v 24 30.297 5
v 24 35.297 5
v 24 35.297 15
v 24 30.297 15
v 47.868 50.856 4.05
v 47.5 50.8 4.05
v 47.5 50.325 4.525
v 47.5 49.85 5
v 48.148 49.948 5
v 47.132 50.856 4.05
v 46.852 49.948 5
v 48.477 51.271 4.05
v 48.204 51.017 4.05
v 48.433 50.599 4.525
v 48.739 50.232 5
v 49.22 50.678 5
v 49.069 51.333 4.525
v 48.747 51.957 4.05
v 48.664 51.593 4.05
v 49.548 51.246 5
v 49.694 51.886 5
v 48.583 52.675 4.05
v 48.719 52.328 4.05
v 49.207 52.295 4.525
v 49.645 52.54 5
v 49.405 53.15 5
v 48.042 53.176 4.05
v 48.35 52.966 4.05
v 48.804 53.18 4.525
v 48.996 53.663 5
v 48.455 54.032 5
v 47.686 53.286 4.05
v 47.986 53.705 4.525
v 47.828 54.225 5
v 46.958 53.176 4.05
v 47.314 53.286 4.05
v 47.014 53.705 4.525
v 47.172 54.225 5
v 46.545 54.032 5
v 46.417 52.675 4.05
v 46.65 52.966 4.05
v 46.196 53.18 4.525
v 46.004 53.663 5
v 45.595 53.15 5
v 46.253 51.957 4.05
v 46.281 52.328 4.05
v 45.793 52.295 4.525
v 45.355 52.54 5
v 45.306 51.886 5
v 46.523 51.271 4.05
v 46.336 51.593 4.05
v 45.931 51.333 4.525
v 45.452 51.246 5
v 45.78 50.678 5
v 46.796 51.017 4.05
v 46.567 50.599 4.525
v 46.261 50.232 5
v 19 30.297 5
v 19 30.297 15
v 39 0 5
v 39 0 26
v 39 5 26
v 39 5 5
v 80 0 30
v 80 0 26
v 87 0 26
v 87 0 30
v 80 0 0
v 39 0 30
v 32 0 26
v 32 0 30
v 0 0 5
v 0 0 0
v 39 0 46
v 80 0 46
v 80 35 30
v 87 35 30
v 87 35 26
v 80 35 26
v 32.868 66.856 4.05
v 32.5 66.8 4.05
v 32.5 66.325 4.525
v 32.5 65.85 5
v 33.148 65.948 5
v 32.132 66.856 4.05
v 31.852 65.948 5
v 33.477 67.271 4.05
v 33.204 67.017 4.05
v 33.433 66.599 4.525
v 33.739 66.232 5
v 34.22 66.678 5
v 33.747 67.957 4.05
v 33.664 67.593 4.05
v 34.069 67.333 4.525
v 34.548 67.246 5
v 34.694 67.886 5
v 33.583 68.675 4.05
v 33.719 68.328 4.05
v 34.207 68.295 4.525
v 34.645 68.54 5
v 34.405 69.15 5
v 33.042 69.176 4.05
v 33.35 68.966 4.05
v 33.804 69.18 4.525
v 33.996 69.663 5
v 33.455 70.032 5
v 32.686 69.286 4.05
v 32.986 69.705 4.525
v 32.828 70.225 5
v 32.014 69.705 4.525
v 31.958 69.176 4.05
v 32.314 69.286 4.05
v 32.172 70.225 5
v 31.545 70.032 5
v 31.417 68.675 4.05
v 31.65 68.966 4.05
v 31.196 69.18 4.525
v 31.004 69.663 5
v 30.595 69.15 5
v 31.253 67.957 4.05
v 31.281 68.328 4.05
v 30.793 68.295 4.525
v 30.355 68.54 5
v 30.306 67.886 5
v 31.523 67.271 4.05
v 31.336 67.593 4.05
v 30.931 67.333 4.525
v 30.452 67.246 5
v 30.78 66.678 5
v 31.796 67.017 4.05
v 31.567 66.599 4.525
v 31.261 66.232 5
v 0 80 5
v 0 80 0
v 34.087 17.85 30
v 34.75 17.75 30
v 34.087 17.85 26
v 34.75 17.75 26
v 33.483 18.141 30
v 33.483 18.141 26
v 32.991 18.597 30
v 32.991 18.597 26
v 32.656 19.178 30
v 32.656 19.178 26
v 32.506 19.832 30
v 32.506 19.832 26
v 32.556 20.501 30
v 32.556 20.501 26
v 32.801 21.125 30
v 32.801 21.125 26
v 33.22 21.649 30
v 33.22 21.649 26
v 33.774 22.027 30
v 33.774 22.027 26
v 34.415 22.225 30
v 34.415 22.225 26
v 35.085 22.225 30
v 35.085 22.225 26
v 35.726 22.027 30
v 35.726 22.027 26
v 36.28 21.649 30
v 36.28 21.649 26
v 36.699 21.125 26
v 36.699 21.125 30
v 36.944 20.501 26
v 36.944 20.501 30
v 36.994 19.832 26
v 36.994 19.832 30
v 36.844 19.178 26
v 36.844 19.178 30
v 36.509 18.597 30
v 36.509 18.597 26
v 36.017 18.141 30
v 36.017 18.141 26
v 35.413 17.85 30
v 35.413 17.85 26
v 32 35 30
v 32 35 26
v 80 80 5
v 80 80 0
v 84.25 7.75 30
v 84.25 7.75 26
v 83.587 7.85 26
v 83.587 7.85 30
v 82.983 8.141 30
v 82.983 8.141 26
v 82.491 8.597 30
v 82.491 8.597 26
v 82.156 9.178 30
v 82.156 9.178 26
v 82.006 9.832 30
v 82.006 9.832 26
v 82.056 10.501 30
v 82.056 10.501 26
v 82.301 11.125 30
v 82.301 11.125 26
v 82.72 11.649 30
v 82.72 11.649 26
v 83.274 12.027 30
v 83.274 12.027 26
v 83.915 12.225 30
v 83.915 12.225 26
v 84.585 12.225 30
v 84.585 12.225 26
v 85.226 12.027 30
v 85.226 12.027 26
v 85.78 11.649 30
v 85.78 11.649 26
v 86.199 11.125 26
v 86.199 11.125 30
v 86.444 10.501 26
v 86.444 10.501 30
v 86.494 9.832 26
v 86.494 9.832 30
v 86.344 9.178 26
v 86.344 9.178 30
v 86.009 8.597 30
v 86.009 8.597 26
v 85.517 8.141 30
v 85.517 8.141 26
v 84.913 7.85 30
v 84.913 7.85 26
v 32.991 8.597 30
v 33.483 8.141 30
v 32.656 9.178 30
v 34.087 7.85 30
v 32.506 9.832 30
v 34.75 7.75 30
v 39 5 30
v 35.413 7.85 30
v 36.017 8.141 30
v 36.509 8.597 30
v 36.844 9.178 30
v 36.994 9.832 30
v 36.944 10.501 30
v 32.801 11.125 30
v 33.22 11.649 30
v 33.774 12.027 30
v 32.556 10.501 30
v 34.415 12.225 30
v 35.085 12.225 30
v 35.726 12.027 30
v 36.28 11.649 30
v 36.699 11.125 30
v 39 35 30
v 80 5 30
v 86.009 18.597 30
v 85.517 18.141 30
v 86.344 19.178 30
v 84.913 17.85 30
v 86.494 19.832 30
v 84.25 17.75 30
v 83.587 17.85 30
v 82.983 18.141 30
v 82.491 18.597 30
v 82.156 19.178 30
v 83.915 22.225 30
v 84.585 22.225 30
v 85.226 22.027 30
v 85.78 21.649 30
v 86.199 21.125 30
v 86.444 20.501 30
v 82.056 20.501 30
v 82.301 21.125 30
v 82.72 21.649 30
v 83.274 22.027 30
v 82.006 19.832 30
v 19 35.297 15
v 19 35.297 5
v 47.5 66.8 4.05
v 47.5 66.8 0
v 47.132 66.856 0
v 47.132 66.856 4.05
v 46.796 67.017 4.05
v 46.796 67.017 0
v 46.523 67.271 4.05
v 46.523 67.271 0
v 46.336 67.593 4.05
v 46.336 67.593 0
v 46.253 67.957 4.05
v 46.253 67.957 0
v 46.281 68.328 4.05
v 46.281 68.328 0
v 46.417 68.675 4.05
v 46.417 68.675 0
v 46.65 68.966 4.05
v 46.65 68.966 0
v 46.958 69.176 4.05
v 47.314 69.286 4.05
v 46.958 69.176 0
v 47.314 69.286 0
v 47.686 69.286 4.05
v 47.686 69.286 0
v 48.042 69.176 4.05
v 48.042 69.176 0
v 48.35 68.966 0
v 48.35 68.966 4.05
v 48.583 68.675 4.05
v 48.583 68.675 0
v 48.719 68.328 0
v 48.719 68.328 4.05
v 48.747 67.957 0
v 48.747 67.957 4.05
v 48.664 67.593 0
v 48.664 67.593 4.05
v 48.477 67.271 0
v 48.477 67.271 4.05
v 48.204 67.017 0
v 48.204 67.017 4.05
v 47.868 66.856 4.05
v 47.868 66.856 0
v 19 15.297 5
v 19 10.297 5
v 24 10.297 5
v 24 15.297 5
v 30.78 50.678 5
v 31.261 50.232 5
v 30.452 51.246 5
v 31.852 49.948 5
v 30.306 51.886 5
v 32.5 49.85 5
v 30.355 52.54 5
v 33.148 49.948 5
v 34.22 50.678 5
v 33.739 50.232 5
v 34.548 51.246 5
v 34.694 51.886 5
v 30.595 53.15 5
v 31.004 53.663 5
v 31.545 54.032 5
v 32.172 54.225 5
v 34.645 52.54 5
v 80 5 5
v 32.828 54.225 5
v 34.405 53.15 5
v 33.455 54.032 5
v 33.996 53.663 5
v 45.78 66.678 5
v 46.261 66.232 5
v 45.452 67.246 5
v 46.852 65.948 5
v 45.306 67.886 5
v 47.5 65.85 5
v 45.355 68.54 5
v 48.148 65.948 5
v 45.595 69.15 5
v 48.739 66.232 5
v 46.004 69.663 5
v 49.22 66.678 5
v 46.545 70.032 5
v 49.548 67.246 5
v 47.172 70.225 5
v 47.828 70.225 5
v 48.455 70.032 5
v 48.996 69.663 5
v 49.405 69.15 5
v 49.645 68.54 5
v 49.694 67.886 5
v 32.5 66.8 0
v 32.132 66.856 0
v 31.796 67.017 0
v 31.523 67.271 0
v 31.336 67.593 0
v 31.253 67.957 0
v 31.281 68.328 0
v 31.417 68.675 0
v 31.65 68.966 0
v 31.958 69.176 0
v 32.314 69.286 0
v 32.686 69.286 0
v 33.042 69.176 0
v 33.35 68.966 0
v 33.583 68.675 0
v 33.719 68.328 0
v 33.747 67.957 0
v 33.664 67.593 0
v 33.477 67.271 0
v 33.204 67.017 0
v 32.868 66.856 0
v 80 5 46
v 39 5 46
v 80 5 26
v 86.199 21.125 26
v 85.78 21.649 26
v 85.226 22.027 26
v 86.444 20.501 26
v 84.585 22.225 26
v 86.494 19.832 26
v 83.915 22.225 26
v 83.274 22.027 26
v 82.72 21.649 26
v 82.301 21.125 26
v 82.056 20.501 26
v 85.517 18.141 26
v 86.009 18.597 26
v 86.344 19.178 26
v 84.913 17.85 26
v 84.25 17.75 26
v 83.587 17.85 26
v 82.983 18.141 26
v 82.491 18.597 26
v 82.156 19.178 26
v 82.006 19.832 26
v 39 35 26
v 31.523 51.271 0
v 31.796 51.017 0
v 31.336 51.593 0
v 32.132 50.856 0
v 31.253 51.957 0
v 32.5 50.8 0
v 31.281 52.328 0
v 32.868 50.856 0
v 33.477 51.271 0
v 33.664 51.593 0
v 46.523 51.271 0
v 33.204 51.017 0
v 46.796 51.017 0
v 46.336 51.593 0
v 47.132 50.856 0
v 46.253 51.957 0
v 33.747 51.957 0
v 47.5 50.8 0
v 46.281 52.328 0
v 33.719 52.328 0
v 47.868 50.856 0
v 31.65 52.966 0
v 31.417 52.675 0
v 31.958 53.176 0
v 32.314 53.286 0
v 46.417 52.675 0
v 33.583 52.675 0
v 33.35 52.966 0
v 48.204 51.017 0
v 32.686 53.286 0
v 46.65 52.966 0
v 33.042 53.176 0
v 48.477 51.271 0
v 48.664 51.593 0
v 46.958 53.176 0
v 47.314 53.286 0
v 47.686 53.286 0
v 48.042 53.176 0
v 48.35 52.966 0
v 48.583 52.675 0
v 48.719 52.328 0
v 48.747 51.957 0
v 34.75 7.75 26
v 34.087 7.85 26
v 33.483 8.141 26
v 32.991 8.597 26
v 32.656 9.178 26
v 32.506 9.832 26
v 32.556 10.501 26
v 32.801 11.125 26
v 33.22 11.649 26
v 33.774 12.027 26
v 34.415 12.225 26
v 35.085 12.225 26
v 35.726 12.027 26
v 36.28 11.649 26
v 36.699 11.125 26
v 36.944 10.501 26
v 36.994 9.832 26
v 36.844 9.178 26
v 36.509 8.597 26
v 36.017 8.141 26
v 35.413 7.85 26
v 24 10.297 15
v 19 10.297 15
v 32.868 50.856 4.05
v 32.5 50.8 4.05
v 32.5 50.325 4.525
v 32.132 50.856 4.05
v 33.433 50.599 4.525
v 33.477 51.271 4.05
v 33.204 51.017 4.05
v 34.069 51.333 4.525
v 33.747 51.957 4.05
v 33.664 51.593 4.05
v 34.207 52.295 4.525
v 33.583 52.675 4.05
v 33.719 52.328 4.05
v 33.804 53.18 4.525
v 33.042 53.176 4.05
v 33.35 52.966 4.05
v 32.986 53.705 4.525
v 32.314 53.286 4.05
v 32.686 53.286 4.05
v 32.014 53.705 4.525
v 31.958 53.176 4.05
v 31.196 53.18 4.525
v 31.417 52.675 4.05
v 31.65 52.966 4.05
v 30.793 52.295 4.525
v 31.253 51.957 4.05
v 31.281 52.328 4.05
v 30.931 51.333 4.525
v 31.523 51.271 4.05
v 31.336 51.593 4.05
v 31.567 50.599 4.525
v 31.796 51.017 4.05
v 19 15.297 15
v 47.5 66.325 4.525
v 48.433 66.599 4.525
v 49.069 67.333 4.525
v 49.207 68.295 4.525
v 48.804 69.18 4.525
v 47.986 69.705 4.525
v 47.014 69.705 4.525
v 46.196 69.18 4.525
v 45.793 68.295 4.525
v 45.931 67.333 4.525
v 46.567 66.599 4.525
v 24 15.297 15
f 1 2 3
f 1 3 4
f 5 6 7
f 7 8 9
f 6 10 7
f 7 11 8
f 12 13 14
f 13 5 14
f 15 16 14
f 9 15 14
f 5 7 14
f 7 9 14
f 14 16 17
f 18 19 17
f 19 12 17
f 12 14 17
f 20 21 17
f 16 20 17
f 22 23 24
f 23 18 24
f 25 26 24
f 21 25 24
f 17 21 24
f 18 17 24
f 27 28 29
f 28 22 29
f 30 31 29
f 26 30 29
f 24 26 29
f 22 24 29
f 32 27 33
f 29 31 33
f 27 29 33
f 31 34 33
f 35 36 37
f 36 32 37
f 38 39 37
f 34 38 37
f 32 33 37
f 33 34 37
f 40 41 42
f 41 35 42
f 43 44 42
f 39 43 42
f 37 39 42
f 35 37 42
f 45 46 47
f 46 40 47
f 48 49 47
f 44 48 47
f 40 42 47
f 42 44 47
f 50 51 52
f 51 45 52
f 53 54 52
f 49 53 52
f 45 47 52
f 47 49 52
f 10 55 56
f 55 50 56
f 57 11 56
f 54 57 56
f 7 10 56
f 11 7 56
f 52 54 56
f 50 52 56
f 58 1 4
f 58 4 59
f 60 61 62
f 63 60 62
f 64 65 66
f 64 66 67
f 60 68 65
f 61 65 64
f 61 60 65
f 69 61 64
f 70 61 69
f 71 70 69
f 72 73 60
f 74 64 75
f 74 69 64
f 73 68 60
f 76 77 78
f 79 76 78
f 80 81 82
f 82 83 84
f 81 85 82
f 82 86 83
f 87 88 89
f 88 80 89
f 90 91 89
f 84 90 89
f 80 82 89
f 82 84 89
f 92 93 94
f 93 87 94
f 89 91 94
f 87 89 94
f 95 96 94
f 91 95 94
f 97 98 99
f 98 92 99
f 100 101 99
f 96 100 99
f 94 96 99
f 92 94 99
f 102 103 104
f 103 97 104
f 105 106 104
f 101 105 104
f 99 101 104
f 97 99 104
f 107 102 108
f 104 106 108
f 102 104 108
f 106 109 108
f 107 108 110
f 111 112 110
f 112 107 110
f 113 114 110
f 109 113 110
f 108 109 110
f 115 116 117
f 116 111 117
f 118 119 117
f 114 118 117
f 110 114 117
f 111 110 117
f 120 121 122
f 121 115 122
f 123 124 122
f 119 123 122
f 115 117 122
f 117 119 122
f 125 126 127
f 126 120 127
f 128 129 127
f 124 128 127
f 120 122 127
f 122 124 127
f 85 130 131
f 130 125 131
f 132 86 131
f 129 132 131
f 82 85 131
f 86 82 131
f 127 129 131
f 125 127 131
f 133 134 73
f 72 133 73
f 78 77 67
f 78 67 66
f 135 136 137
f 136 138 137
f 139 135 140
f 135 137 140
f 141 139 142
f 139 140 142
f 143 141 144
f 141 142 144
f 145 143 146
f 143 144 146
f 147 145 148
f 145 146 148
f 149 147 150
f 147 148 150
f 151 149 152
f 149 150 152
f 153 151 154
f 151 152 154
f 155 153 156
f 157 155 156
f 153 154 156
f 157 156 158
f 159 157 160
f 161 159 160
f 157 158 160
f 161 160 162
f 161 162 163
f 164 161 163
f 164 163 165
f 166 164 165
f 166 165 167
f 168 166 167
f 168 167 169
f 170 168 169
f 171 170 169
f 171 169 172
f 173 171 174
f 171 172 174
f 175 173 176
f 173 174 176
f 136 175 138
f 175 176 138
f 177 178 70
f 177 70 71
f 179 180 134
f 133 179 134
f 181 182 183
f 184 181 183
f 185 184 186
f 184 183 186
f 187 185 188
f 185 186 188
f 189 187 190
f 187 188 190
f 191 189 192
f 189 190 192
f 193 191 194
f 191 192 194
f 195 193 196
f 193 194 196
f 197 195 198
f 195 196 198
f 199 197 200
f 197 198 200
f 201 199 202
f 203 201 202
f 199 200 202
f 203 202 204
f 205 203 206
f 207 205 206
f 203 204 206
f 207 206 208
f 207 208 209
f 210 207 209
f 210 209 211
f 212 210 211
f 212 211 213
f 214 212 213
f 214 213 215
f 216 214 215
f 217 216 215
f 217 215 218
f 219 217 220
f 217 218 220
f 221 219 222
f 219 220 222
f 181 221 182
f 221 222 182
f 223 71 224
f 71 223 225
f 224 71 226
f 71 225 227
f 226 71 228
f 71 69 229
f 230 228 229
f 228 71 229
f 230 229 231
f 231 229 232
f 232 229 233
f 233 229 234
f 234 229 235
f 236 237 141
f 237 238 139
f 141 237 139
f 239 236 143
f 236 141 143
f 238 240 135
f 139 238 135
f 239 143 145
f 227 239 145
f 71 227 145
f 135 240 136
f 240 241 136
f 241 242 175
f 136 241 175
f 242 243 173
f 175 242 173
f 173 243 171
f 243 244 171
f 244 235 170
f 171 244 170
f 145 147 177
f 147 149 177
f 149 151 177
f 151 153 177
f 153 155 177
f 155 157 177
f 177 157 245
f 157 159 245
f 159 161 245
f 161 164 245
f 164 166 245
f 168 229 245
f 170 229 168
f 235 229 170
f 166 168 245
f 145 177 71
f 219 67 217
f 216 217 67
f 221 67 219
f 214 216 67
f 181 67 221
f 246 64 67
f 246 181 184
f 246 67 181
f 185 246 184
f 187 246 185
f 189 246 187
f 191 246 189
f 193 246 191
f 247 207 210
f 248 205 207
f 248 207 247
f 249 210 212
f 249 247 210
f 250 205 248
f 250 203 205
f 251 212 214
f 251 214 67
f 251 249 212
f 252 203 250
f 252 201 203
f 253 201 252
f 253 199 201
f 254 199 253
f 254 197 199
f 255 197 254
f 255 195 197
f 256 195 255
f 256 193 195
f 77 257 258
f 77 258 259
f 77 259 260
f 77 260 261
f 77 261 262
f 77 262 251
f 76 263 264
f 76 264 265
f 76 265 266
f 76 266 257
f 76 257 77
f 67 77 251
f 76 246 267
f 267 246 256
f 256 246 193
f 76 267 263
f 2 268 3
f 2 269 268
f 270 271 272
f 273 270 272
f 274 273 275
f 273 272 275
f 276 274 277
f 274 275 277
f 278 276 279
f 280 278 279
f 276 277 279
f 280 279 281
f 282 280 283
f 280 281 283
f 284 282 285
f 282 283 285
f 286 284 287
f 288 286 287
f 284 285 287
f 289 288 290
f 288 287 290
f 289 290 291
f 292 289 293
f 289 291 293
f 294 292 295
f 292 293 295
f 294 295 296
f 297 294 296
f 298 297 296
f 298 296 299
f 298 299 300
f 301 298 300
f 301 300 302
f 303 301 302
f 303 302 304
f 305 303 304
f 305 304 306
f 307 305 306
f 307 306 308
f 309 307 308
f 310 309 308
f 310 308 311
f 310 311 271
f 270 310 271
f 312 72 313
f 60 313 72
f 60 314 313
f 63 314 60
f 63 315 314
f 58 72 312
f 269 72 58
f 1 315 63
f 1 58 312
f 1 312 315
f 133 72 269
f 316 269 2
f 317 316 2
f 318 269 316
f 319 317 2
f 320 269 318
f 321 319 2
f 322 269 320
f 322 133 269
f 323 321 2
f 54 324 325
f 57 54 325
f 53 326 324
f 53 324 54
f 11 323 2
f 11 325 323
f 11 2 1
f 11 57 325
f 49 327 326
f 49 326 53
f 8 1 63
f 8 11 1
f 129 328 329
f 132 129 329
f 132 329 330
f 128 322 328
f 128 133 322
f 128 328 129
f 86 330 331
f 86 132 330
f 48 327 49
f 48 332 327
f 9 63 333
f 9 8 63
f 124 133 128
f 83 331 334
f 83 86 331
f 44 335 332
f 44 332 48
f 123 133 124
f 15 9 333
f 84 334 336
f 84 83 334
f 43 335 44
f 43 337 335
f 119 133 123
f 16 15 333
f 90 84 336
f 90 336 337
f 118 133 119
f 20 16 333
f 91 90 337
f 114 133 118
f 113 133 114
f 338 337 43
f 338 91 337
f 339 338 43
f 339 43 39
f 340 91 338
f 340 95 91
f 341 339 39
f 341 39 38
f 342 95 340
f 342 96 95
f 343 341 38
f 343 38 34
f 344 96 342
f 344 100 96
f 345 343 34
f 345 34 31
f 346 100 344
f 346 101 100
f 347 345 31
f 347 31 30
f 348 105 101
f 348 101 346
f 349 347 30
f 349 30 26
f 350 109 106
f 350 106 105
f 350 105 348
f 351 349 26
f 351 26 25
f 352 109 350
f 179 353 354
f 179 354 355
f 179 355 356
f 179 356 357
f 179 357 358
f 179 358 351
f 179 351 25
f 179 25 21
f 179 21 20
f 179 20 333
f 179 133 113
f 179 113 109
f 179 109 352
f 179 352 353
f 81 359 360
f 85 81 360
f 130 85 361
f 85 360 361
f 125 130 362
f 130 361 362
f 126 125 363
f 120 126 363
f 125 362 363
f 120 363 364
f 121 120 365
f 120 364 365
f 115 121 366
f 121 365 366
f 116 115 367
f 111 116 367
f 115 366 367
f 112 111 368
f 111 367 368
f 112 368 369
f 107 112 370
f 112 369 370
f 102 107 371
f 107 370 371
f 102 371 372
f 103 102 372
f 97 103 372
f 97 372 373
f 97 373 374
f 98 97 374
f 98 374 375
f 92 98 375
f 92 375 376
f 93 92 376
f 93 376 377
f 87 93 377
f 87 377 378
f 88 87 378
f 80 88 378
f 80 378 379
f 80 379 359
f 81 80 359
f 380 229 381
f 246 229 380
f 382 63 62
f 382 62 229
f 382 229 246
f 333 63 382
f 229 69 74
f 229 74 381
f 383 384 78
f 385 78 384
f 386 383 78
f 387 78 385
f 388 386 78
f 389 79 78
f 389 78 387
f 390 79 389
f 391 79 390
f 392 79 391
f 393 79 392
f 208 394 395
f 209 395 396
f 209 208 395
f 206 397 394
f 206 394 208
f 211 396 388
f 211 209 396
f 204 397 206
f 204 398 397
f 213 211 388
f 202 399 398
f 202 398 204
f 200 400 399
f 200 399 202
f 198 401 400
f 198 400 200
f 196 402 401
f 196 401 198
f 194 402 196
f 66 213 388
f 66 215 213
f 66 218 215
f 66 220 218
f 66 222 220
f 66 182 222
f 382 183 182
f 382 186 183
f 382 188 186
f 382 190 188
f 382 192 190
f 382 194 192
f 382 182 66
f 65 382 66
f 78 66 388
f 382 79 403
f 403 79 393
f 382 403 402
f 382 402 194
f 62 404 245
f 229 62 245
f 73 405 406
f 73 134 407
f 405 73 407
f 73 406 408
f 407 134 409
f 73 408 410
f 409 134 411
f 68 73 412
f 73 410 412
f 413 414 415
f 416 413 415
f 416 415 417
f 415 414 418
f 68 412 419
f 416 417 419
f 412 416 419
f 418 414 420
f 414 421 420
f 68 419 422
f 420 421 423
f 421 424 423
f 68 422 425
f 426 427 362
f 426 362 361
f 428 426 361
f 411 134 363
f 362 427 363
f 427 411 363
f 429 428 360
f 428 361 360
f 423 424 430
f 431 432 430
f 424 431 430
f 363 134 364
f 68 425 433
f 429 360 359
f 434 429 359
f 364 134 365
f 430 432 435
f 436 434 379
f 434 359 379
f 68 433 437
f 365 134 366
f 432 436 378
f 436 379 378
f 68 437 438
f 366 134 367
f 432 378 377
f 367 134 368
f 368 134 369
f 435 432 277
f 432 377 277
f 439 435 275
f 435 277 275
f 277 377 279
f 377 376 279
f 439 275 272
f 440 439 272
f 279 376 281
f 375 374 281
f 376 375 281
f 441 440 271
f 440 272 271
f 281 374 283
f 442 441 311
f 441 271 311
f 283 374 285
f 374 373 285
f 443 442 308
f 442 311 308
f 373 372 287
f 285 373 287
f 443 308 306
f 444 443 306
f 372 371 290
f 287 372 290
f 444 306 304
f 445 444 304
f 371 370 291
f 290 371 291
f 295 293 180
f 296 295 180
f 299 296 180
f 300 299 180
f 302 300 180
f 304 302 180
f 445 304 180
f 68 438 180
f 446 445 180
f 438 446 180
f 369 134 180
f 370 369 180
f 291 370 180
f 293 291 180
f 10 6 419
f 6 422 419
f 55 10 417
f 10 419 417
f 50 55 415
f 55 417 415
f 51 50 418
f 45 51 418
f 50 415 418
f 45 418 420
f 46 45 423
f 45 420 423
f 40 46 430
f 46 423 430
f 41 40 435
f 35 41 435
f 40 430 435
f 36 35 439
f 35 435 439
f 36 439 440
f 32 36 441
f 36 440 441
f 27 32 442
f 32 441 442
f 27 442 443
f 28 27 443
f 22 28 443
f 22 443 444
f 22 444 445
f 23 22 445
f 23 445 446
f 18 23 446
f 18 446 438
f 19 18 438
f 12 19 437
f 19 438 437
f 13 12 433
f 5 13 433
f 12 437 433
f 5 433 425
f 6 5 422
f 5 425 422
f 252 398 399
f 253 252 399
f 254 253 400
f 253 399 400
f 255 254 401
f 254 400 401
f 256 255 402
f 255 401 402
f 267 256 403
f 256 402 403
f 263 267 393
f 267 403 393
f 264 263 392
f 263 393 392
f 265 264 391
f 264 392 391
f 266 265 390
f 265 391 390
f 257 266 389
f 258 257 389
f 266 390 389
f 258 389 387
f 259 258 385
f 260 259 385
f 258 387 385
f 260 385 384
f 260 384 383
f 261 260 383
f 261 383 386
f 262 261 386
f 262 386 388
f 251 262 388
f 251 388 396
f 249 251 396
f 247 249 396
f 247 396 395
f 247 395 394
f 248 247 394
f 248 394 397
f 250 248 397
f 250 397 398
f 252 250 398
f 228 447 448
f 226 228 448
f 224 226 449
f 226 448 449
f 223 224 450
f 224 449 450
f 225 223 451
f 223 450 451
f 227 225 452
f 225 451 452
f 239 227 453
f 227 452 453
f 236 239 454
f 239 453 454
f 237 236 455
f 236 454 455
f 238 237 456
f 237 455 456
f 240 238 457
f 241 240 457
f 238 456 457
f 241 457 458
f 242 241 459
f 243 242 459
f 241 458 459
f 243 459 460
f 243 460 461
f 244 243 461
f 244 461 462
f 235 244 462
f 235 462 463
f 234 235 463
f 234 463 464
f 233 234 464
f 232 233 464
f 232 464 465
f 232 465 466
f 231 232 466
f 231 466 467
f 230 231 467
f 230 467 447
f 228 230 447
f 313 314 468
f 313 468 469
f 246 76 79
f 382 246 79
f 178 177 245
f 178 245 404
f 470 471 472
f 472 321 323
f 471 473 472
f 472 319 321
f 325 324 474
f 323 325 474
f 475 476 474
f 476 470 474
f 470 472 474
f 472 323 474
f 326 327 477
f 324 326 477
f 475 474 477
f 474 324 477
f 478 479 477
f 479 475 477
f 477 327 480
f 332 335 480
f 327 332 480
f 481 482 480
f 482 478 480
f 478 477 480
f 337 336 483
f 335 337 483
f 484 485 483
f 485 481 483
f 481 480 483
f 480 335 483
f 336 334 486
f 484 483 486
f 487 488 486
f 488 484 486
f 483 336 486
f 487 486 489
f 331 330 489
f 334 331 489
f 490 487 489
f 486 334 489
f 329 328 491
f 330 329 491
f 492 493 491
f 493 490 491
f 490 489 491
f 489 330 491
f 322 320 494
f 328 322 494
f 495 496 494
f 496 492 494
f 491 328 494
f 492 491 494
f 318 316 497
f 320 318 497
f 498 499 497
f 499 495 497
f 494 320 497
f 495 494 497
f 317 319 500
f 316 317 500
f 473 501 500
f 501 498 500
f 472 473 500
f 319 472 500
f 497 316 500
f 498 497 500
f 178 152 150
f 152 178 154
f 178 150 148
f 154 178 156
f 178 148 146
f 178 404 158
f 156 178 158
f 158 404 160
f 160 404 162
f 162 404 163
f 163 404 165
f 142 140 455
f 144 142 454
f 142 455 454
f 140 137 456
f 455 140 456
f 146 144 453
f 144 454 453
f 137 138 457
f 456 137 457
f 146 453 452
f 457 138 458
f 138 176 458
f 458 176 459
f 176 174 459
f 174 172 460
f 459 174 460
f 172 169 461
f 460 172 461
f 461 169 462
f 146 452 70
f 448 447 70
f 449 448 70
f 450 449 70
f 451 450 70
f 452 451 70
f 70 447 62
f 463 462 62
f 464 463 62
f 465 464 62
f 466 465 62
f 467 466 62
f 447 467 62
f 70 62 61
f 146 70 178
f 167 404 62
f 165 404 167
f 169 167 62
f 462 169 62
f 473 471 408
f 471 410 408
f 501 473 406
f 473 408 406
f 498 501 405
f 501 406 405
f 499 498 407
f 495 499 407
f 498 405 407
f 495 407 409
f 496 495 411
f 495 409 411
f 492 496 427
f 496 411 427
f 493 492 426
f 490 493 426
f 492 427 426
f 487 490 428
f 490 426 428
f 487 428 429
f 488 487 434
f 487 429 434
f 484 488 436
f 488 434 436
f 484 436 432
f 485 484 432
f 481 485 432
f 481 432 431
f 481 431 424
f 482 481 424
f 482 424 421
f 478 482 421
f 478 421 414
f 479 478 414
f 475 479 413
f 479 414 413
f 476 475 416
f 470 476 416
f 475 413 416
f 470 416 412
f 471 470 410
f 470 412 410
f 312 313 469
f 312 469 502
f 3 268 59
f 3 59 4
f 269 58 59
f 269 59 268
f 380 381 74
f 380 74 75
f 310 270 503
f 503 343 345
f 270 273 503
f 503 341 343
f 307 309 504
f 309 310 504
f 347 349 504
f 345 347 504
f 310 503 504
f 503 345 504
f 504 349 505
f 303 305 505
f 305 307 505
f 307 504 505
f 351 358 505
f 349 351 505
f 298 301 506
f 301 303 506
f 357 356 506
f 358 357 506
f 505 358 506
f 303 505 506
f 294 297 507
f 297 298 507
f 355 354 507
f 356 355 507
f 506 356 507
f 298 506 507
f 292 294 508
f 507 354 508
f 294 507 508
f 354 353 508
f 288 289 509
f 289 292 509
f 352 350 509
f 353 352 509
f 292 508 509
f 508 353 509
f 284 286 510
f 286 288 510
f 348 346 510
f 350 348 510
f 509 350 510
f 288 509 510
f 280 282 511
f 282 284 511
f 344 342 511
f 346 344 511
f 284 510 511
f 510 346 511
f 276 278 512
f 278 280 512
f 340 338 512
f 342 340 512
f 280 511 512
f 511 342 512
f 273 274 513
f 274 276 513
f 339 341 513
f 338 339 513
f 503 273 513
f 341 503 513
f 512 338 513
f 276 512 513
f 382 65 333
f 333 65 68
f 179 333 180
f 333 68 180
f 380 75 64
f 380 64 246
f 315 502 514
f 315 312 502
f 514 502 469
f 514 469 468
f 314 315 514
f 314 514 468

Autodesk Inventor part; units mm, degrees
ref_plane "YZ Plane" through (0, 0, 0) normal (1, 0, 0) x (0, 1, 0)
ref_plane "XZ Plane" through (0, 0, 0) normal (0, 1, 0) x (-1, 0, 0)
ref_plane "XY Plane" through (0, 0, 0) normal (0, 0, 1) x (1, 0, 0)
sketch "Szkic1" plane through (0, 0, 0) normal (0, 0, 1) x (1, 0, 0)
  line L0 (0, 0) -> (80, 0)
  line L1 (80, 0) -> (80, 80)
  line L2 (80, 80) -> (0, 80)
  line L3 (0, 80) -> (0, 0)
  dimension "d0" = 80
  dimension "d1" = 80
extrude "Wyciągnięcie proste1" add sketch "Szkic1" along normal blind 5
sketch "Szkic2" plane through (0, 0, 5) normal (0, 0, 1) x (1, 0, 0)
  line L0 (80, 0) -> (80, 80) projected
  line L1 (80, 0) -> (39, 0)
  line L2 (39, 0) -> (39, 5)
  line L3 (39, 5) -> (80, 5)
  line L4 (80, 5) -> (80, 0)
  point P0 (0, 0)
  dimension "d6" = 41
  dimension "d7" = 5
extrude "Wyciągnięcie proste2" add sketch "Szkic2" along normal blind 41
sketch "Szkic3" plane through (0, 0, 5) normal (0, 0, 1) x (1, 0, 0)
  line L0 (19, 35.2968) -> (24, 35.2968)
  line L1 (24, 35.2968) -> (24, 30.2968)
  line L2 (24, 30.2968) -> (19, 30.2968)
  line L3 (19, 30.2968) -> (19, 35.2968)
  line L4 (19, 15.2968) -> (24, 15.2968)
  line L5 (24, 15.2968) -> (24, 10.2968)
  line L6 (24, 10.2968) -> (19, 10.2968)
  line L7 (19, 10.2968) -> (19, 15.2968)
  line L8 (39, 5) -> (39, 0) projected
  point P0 (0, 0)
  point P1 (39, 2.5)
  point P2 (24, 12.7968)
  dimension "d10" = 5
  dimension "d11" = 5
  dimension "d12" = 5
  dimension "d13" = 15
  dimension "d14" = 15
extrude "Wyciągnięcie proste3" add sketch "Szkic3" along normal blind 10
sketch "Szkic4" plane through (0, 0, 5) normal (0, 0, 1) x (1, 0, 0)
  line L0 (80, 80) -> (0, 80) projected
  line L1 (80, 5) -> (80, 80) projected
  point P0 (0, 0)
  point P1 (32.5, 68.05)
  point P2 (47.5, 68.05)
  point P3 (47.5, 52.05)
  point P4 (32.5, 52.05)
  dimension "d17" = 11.95
  dimension "d18" = 11.95
  dimension "d19" = 15
  dimension "d20" = 15
  dimension "d21" = 16
  dimension "d22" = 16
  dimension "d23" = 32.5
  dimension "d24" = 32.5
hole "Otwór1" at (32.5, 68.05, 5) at (47.5, 68.05, 5) at (47.5, 52.05, 5) at (32.5, 52.05, 5) direction (0, 0, -1) diameter 2.5 depth 5 countersink diameter 4.4 countersink angle 90 clearance for "Śruba ze łbem płaskim obrobiona" size "M2" standard "ANSI Profil metryczny M"
sketch "Szkic5" plane through (39, 0, 5) normal (-1, 0, 0) x (0, 0, 1)
  line L0 (-5, 0) -> (41, 0) projected
  line L1 (21, 0) -> (25, 0)
  line L2 (25, 0) -> (25, 35)
  line L3 (25, 35) -> (21, 35)
  line L4 (21, 35) -> (21, 0)
  line L5 (0, 80) -> (0, 0) projected
  dimension "d32" = 4
  dimension "d33" = 35
  dimension "d34" = 21
extrude "Wyciągnięcie proste4" add sketch "Szkic5" along normal blind 7
sketch "Szkic6" plane through (80, 0, 0) normal (1, 0, 0) x (0, 0, -1)
  line L0 (-30, 5) -> (-30, 35) projected
  line L1 (-5, 0) -> (-26, 0) projected
  line L2 (-30, 35) -> (-26, 35)
  line L3 (-26, 35) -> (-26, 0)
  line L4 (-26, 0) -> (-30, 0)
  line L5 (-30, 0) -> (-30, 35)
  point P0 (0, 0)
  point P1 (-30, 5)
extrude "Wyciągnięcie proste5" add sketch "Szkic6" along normal blind 7
sketch "Szkic10" plane through (39, 5, 30) normal (0, 0, 1) x (1, 0, 0)
  line L0 (0, -5) -> (-7, -5) projected
  line L1 (41, -5) -> (48, -5) projected
  line L2 (-7, -5) -> (-7, 30) projected
  line L3 (48, 30) -> (48, -5) projected
  point P0 (-39, -5)
  point P1 (-4.25, 15)
  point P2 (-4.25, 5)
  point P3 (45.25, 15)
  point P4 (45.25, 5)
  point P5 (-3.5, -5)
  dimension "d43" = 10
  dimension "d46" = 10
  dimension "d47" = 10
  dimension "d48" = 2.75
  dimension "d49" = 2.75
  dimension "d50" = 10
  dimension "d51" = 2.75
  dimension "d52" = 2.75
hole "Otwór2" at (34.75, 20, 30) at (34.75, 10, 30) at (84.25, 20, 30) at (84.25, 10, 30) direction (0, 0, -1) diameter 4.5 depth 4 clearance for "Śruba ze łbem płaskim obrobiona" size "M4" standard "ANSI Profil metryczny M"
equation "\"d18\" = d17"
equation "\"d22\" = d21"
equation "\"d24\" = d23"
equation "\"d47\" = d46"
equation "\"d49\" = d48"
equation "\"d52\" = d51"
properties part number "podstawa_rysika"
